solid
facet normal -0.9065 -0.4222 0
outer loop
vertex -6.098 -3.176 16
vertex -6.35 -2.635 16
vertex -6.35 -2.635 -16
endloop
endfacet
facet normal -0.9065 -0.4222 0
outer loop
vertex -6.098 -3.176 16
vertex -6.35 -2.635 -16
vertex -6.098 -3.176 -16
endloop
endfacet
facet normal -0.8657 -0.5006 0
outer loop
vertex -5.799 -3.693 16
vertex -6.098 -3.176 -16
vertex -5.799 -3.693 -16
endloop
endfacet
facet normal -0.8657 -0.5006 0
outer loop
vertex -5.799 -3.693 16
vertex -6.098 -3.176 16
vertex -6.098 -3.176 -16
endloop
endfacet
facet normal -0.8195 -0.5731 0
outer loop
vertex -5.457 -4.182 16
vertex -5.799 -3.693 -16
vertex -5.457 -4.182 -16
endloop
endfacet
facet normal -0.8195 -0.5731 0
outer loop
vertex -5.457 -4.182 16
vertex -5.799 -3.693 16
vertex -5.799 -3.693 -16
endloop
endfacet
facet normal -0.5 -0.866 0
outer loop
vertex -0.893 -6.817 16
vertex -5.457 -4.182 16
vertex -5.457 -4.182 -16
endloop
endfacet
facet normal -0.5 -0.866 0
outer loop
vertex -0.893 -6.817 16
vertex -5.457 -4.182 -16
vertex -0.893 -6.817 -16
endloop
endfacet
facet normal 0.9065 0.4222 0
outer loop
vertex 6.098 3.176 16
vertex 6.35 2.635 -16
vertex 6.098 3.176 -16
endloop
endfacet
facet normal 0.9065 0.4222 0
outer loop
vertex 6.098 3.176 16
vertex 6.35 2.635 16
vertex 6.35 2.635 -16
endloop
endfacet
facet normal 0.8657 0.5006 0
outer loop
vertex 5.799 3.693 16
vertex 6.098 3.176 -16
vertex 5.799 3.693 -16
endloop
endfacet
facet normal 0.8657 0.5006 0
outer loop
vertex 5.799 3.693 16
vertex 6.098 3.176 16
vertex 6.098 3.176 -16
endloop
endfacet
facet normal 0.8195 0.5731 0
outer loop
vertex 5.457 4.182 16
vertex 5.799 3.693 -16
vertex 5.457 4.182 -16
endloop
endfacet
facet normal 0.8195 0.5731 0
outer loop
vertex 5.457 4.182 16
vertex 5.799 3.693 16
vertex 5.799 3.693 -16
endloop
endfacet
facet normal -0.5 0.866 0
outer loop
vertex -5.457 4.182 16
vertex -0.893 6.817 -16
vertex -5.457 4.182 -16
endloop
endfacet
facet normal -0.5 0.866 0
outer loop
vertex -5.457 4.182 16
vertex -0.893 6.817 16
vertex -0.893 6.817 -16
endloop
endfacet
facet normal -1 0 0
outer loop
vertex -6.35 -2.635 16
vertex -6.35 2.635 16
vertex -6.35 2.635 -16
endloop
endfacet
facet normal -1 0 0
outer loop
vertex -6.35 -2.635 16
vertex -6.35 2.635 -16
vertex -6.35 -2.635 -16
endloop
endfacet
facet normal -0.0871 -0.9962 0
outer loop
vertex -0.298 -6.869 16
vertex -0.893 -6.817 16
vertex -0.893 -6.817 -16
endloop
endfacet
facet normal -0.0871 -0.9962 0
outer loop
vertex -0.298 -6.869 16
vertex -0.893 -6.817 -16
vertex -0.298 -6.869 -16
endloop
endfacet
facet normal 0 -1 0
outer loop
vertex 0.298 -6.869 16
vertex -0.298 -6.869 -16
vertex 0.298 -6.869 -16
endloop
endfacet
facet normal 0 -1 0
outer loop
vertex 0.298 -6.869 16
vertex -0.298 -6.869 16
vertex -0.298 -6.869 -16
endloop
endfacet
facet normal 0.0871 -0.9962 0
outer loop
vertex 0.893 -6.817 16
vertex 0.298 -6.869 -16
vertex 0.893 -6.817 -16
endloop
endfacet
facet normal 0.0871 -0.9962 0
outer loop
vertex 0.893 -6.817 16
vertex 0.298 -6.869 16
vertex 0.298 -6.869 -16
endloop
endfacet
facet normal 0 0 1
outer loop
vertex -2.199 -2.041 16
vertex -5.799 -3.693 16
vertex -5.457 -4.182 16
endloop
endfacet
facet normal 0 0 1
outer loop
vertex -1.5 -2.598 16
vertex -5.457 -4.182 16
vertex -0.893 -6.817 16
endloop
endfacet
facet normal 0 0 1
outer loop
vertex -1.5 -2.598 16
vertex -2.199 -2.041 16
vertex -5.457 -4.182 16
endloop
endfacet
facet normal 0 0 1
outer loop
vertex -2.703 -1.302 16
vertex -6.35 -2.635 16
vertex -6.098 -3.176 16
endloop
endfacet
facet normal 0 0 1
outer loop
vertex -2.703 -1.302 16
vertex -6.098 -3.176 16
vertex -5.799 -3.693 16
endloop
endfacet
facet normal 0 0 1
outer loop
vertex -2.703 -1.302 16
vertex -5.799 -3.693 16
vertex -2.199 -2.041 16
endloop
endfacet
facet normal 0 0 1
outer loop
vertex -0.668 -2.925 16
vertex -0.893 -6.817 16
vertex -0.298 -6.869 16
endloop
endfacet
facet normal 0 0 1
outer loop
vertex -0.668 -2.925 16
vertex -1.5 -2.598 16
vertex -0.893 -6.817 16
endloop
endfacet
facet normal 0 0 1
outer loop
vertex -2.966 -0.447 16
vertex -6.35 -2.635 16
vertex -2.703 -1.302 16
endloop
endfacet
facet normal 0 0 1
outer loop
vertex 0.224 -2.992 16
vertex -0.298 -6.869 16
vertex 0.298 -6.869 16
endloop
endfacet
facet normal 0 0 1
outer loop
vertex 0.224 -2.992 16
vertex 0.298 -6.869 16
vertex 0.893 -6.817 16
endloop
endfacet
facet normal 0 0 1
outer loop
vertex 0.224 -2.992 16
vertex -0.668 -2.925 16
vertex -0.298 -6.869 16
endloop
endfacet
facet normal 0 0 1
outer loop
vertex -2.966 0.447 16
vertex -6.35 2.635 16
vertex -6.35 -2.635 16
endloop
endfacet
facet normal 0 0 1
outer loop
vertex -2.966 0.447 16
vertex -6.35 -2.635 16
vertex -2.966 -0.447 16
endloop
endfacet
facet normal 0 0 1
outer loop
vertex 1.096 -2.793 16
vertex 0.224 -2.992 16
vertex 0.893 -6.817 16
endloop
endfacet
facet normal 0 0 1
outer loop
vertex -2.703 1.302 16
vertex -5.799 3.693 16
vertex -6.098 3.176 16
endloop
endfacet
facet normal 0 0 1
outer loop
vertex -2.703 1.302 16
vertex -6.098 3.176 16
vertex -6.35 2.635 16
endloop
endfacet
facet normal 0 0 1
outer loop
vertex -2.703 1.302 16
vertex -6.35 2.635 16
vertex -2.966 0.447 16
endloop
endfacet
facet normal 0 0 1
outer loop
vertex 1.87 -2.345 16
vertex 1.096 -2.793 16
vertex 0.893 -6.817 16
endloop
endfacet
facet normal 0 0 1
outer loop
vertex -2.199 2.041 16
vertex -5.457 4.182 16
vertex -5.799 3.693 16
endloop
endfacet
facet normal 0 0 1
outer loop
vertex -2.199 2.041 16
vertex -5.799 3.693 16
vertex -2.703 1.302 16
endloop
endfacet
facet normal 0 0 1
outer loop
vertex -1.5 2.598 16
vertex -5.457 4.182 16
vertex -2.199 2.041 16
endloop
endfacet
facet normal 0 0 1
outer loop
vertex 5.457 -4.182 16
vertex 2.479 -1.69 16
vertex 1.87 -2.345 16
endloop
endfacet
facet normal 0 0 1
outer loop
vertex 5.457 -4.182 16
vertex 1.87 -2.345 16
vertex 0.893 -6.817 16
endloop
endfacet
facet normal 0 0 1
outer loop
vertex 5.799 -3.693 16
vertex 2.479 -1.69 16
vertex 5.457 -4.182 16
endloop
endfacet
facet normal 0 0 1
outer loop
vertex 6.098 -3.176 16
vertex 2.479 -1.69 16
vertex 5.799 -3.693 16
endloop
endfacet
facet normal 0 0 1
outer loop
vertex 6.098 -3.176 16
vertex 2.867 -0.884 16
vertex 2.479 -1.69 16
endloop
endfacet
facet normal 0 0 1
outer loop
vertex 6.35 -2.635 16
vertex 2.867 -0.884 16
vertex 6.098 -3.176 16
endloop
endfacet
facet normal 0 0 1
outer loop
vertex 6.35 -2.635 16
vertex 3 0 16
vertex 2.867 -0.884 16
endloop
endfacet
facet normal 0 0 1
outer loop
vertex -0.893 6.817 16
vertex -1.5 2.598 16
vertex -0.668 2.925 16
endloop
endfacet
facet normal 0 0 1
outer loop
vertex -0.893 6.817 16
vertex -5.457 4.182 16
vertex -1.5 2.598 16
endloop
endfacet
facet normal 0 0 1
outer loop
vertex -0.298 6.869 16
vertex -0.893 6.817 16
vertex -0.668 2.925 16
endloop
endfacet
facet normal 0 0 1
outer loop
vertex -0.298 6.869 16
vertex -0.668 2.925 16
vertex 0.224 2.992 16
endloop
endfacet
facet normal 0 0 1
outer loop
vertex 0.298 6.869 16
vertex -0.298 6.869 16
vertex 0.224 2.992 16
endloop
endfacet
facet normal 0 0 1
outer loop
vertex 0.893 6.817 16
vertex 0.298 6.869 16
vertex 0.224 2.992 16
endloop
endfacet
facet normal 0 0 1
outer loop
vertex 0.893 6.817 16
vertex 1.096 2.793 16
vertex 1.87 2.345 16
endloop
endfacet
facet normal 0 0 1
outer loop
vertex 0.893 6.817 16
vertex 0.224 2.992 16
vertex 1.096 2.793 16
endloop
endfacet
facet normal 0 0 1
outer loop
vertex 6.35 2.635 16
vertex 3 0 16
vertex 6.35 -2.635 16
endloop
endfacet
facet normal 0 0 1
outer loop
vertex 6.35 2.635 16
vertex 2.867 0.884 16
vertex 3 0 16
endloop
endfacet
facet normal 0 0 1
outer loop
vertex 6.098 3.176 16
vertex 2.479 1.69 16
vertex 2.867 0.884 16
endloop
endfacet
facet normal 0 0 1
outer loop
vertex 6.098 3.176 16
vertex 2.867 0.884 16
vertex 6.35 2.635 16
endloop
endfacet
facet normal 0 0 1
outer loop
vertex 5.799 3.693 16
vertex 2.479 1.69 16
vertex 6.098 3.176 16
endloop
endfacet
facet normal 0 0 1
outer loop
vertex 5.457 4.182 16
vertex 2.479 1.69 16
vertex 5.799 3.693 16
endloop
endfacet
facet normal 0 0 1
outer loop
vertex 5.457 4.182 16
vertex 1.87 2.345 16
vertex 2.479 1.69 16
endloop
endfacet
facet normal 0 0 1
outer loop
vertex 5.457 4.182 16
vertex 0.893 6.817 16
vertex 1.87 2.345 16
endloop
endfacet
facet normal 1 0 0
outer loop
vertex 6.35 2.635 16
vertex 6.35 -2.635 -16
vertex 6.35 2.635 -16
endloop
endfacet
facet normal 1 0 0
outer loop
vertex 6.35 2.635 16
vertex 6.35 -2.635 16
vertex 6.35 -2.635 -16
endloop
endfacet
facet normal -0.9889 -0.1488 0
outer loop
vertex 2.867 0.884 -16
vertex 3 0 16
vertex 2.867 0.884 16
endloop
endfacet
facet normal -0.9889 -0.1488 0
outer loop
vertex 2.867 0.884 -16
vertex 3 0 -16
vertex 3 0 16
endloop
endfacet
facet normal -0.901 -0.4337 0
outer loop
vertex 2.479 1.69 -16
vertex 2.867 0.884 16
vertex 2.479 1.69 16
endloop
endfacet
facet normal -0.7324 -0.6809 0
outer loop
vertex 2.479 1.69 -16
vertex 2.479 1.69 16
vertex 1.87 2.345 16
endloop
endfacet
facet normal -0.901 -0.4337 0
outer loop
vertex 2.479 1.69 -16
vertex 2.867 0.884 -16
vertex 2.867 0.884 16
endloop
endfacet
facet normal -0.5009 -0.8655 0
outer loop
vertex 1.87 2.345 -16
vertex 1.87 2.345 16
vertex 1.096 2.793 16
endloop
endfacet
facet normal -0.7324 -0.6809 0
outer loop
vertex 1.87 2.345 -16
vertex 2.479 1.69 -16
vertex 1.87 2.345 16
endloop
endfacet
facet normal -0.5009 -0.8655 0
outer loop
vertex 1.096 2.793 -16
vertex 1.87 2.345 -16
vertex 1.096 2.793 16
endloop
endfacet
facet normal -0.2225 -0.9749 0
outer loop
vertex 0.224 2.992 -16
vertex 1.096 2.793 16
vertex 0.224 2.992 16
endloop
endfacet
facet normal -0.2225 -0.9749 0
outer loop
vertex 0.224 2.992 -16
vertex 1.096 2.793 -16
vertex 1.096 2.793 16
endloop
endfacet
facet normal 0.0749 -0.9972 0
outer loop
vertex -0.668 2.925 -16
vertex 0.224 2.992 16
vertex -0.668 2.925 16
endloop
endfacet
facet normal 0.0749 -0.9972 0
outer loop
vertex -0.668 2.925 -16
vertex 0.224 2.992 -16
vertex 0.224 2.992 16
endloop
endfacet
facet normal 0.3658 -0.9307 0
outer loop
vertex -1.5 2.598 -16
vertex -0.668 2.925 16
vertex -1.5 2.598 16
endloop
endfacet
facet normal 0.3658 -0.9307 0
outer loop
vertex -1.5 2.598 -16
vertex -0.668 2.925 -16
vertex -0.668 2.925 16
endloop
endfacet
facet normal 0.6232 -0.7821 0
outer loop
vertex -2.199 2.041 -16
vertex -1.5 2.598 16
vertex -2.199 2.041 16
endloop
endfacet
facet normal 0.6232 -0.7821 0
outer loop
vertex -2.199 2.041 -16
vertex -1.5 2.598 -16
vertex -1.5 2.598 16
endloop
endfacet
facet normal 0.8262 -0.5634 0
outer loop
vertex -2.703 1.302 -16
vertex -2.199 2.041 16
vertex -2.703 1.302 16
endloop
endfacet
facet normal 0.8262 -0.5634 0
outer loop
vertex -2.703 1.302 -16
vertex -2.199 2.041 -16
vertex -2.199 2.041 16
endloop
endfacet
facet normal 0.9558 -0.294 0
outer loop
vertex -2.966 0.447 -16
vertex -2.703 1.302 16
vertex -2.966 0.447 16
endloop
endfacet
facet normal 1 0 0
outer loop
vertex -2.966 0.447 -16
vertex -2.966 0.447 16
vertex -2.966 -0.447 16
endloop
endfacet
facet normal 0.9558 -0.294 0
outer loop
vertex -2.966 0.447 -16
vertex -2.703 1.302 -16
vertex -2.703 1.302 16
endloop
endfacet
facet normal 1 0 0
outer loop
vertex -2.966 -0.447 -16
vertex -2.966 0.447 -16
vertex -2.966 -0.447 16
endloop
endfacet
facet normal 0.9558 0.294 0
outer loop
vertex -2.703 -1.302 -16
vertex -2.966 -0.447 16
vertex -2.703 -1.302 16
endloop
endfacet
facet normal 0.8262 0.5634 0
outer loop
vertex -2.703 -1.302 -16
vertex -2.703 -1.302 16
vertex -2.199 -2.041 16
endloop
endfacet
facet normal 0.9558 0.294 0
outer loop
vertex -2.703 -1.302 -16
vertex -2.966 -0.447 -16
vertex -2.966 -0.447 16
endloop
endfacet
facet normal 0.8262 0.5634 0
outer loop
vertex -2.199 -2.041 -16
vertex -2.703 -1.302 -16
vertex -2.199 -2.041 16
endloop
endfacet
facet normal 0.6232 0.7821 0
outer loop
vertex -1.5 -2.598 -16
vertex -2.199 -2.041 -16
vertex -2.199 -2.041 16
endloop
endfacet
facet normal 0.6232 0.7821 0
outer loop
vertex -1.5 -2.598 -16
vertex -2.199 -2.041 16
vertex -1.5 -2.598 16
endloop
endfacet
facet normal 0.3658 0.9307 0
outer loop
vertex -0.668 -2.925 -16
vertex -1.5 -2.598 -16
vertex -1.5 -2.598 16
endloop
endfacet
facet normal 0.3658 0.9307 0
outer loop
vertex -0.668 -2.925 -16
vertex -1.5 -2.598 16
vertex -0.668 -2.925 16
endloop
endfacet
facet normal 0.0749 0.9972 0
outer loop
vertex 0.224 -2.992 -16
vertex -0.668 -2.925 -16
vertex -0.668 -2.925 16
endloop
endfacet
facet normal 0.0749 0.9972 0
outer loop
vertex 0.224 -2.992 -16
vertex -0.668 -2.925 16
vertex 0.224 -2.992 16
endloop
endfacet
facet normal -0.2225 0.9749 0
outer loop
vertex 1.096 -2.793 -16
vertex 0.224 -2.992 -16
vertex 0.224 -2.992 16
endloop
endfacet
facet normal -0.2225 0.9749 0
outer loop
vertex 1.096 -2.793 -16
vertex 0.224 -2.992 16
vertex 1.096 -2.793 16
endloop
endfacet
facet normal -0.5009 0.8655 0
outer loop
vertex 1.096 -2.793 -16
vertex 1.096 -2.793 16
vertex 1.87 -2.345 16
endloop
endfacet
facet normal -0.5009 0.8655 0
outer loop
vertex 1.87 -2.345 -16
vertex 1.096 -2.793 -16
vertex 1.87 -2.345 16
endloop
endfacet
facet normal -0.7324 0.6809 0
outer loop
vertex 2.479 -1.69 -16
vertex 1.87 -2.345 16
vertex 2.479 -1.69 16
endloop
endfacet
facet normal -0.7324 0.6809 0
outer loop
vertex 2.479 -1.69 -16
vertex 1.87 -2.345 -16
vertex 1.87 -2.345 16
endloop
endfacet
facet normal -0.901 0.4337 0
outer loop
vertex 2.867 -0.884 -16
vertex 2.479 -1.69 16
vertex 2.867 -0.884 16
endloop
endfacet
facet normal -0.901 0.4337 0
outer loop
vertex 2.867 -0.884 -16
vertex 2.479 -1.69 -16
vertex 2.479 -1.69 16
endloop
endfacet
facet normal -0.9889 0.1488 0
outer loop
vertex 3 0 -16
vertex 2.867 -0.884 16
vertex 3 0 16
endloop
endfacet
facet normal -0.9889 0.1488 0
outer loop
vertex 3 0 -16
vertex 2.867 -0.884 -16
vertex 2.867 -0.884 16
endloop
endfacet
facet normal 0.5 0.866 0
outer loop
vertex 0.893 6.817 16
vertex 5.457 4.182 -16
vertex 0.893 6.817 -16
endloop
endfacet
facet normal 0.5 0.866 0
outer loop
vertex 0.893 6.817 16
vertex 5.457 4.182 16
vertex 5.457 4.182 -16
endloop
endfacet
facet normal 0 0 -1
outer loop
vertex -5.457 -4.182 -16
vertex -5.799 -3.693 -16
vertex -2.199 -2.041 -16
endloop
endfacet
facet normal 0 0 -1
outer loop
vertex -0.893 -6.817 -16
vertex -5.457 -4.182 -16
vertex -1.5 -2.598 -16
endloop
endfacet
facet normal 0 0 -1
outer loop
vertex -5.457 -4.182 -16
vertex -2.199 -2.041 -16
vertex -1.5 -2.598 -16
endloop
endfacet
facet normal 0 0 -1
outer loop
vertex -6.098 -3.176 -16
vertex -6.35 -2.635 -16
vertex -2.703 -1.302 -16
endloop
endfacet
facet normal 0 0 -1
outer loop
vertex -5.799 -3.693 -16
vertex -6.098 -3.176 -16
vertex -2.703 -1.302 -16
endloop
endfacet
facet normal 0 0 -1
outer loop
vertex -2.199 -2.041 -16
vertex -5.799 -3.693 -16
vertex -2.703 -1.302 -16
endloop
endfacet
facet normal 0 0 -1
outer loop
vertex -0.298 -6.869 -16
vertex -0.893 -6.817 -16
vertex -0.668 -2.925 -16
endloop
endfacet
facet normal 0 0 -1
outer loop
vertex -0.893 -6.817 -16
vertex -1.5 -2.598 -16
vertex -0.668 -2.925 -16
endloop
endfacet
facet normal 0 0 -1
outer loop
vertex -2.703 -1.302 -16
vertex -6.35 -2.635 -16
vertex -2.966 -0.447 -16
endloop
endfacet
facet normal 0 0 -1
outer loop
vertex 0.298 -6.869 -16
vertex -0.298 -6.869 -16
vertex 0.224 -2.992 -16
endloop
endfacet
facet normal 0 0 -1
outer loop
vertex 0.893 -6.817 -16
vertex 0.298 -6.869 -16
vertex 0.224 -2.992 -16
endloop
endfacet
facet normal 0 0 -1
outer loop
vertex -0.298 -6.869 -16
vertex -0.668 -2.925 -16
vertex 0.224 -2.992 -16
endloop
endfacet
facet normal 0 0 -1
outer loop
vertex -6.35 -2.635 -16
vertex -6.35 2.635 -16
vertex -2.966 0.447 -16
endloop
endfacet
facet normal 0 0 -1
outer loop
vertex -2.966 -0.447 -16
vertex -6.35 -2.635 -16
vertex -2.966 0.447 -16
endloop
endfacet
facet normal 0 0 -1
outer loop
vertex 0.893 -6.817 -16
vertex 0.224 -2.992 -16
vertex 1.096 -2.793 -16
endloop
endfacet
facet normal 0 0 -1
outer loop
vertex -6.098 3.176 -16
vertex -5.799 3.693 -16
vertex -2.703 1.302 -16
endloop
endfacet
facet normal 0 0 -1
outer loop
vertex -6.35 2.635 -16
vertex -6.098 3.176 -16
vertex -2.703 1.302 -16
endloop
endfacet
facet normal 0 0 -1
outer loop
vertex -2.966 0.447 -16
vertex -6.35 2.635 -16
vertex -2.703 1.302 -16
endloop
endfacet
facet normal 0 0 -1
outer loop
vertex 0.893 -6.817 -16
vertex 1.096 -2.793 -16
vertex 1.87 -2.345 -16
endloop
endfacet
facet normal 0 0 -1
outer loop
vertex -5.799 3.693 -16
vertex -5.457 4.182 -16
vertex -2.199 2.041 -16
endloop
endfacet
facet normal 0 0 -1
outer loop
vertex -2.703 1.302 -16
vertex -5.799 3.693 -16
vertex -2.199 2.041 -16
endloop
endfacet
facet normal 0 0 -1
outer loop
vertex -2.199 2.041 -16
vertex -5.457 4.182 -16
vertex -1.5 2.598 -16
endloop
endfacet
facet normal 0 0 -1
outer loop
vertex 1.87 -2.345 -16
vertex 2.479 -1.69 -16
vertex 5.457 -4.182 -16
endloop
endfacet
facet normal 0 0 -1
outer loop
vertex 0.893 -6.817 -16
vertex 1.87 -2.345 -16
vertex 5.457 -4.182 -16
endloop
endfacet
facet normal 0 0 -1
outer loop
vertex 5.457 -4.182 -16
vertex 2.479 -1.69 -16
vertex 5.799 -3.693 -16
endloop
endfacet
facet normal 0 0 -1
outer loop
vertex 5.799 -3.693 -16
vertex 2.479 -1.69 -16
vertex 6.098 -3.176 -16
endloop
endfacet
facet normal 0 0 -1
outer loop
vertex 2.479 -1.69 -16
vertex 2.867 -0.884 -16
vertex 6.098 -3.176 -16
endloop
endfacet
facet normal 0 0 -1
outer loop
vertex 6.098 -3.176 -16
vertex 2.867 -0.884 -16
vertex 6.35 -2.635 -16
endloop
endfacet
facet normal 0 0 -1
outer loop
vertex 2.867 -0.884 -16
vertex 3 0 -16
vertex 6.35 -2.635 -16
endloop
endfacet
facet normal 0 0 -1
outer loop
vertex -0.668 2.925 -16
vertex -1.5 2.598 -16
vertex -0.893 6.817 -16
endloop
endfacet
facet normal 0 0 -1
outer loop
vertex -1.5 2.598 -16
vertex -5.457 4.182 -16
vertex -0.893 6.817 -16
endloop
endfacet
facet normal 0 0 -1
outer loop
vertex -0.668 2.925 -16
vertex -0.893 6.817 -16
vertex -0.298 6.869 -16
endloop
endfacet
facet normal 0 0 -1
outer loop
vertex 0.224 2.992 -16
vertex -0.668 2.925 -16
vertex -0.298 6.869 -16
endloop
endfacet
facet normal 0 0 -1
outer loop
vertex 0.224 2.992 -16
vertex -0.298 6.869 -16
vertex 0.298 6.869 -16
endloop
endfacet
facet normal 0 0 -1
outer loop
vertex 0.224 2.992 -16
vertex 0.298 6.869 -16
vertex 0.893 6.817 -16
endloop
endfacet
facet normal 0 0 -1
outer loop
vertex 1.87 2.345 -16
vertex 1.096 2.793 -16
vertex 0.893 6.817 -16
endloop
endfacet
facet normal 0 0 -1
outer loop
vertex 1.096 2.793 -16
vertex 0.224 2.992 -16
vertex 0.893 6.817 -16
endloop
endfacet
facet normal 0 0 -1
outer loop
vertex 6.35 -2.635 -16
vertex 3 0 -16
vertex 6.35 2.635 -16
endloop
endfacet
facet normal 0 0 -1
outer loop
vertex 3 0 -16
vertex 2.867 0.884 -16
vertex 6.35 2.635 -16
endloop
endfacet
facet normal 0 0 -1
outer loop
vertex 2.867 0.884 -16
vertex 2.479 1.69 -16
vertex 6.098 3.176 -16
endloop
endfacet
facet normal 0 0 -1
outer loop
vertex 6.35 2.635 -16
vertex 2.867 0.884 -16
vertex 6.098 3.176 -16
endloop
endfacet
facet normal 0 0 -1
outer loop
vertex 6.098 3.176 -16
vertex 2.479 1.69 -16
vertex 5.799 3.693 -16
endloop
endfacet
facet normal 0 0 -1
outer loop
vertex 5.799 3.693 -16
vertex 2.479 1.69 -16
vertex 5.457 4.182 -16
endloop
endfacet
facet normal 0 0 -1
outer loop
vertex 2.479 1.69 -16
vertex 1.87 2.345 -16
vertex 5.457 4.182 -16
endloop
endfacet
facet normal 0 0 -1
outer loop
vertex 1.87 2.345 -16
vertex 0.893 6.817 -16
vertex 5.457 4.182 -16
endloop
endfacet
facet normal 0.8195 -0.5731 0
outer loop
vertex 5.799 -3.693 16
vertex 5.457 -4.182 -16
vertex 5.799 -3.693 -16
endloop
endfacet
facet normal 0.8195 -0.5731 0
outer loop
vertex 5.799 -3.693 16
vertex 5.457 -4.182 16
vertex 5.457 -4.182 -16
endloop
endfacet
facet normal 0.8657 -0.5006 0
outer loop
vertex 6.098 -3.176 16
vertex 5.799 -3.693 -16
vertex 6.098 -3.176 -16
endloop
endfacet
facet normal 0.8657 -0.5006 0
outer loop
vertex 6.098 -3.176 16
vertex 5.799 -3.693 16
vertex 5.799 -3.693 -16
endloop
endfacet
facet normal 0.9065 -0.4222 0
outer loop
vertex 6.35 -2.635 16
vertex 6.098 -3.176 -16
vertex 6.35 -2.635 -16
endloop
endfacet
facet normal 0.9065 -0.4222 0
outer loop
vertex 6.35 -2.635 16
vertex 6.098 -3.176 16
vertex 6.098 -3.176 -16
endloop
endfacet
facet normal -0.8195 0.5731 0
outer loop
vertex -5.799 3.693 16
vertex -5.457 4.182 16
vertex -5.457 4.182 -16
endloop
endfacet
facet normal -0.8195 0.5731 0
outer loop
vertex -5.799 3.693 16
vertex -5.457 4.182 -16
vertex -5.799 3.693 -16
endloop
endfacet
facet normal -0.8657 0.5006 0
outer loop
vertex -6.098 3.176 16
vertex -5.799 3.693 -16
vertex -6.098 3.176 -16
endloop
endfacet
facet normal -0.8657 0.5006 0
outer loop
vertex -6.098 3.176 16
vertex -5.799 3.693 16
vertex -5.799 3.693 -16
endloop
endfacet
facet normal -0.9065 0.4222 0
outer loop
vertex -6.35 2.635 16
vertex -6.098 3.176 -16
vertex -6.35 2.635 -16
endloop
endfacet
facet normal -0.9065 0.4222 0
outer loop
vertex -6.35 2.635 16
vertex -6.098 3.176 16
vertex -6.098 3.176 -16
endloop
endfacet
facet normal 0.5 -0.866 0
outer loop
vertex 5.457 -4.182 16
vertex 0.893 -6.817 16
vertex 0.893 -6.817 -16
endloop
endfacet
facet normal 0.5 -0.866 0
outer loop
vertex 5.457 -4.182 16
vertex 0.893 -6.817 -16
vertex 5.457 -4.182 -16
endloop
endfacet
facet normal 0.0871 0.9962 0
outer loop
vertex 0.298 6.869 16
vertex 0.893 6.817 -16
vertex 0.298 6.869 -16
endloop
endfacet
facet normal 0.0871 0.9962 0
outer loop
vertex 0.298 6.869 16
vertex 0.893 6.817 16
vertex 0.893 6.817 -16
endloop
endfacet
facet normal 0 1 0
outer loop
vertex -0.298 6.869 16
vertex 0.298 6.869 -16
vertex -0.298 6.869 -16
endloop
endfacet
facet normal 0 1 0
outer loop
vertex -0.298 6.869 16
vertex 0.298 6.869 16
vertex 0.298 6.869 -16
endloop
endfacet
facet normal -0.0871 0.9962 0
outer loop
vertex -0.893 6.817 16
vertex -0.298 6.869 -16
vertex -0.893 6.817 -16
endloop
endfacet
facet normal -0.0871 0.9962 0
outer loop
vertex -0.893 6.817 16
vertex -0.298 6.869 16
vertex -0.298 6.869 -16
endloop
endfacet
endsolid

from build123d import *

# Parameters (mm, degrees)
SKETCH1_R           = 3
BOSS_EXTRUDE1_DEPTH = 16


with BuildPart() as part:
    # Sketch1 → Boss-Extrude1 (new, symmetric)
    with BuildSketch(Plane.XY):
        with BuildLine():
            Line((-0.893039494, 6.816751826), (-5.456960506, 4.181770802))
            ThreePointArc((-5.456960506, 4.181770802), (-5.953924651, 3.4375), (-6.35, 2.634981025))
            Line((-6.35, 2.634981025), (-6.35, -2.634981025))
            ThreePointArc((-6.35, -2.634981025), (-5.953924651, -3.4375), (-5.456960506, -4.181770802))
            Line((-5.456960506, -4.181770802), (-0.893039494, -6.816751826))
            ThreePointArc((-0.893039494, -6.816751826), (0, -6.875), (0.893039494, -6.816751826))
            Line((0.893039494, -6.816751826), (5.456960506, -4.181770802))
            ThreePointArc((5.456960506, -4.181770802), (5.953924651, -3.4375), (6.35, -2.634981025))
            Line((6.35, -2.634981025), (6.35, 2.634981025))
            ThreePointArc((6.35, 2.634981025), (5.953924651, 3.4375), (5.456960506, 4.181770802))
            Line((5.456960506, 4.181770802), (0.893039494, 6.816751826))
            ThreePointArc((0.893039494, 6.816751826), (0, 6.875), (-0.893039494, 6.816751826))
        make_face()
        Circle(SKETCH1_R, mode=Mode.SUBTRACT)
    extrude(amount=BOSS_EXTRUDE1_DEPTH, both=True)


solid = part.part
